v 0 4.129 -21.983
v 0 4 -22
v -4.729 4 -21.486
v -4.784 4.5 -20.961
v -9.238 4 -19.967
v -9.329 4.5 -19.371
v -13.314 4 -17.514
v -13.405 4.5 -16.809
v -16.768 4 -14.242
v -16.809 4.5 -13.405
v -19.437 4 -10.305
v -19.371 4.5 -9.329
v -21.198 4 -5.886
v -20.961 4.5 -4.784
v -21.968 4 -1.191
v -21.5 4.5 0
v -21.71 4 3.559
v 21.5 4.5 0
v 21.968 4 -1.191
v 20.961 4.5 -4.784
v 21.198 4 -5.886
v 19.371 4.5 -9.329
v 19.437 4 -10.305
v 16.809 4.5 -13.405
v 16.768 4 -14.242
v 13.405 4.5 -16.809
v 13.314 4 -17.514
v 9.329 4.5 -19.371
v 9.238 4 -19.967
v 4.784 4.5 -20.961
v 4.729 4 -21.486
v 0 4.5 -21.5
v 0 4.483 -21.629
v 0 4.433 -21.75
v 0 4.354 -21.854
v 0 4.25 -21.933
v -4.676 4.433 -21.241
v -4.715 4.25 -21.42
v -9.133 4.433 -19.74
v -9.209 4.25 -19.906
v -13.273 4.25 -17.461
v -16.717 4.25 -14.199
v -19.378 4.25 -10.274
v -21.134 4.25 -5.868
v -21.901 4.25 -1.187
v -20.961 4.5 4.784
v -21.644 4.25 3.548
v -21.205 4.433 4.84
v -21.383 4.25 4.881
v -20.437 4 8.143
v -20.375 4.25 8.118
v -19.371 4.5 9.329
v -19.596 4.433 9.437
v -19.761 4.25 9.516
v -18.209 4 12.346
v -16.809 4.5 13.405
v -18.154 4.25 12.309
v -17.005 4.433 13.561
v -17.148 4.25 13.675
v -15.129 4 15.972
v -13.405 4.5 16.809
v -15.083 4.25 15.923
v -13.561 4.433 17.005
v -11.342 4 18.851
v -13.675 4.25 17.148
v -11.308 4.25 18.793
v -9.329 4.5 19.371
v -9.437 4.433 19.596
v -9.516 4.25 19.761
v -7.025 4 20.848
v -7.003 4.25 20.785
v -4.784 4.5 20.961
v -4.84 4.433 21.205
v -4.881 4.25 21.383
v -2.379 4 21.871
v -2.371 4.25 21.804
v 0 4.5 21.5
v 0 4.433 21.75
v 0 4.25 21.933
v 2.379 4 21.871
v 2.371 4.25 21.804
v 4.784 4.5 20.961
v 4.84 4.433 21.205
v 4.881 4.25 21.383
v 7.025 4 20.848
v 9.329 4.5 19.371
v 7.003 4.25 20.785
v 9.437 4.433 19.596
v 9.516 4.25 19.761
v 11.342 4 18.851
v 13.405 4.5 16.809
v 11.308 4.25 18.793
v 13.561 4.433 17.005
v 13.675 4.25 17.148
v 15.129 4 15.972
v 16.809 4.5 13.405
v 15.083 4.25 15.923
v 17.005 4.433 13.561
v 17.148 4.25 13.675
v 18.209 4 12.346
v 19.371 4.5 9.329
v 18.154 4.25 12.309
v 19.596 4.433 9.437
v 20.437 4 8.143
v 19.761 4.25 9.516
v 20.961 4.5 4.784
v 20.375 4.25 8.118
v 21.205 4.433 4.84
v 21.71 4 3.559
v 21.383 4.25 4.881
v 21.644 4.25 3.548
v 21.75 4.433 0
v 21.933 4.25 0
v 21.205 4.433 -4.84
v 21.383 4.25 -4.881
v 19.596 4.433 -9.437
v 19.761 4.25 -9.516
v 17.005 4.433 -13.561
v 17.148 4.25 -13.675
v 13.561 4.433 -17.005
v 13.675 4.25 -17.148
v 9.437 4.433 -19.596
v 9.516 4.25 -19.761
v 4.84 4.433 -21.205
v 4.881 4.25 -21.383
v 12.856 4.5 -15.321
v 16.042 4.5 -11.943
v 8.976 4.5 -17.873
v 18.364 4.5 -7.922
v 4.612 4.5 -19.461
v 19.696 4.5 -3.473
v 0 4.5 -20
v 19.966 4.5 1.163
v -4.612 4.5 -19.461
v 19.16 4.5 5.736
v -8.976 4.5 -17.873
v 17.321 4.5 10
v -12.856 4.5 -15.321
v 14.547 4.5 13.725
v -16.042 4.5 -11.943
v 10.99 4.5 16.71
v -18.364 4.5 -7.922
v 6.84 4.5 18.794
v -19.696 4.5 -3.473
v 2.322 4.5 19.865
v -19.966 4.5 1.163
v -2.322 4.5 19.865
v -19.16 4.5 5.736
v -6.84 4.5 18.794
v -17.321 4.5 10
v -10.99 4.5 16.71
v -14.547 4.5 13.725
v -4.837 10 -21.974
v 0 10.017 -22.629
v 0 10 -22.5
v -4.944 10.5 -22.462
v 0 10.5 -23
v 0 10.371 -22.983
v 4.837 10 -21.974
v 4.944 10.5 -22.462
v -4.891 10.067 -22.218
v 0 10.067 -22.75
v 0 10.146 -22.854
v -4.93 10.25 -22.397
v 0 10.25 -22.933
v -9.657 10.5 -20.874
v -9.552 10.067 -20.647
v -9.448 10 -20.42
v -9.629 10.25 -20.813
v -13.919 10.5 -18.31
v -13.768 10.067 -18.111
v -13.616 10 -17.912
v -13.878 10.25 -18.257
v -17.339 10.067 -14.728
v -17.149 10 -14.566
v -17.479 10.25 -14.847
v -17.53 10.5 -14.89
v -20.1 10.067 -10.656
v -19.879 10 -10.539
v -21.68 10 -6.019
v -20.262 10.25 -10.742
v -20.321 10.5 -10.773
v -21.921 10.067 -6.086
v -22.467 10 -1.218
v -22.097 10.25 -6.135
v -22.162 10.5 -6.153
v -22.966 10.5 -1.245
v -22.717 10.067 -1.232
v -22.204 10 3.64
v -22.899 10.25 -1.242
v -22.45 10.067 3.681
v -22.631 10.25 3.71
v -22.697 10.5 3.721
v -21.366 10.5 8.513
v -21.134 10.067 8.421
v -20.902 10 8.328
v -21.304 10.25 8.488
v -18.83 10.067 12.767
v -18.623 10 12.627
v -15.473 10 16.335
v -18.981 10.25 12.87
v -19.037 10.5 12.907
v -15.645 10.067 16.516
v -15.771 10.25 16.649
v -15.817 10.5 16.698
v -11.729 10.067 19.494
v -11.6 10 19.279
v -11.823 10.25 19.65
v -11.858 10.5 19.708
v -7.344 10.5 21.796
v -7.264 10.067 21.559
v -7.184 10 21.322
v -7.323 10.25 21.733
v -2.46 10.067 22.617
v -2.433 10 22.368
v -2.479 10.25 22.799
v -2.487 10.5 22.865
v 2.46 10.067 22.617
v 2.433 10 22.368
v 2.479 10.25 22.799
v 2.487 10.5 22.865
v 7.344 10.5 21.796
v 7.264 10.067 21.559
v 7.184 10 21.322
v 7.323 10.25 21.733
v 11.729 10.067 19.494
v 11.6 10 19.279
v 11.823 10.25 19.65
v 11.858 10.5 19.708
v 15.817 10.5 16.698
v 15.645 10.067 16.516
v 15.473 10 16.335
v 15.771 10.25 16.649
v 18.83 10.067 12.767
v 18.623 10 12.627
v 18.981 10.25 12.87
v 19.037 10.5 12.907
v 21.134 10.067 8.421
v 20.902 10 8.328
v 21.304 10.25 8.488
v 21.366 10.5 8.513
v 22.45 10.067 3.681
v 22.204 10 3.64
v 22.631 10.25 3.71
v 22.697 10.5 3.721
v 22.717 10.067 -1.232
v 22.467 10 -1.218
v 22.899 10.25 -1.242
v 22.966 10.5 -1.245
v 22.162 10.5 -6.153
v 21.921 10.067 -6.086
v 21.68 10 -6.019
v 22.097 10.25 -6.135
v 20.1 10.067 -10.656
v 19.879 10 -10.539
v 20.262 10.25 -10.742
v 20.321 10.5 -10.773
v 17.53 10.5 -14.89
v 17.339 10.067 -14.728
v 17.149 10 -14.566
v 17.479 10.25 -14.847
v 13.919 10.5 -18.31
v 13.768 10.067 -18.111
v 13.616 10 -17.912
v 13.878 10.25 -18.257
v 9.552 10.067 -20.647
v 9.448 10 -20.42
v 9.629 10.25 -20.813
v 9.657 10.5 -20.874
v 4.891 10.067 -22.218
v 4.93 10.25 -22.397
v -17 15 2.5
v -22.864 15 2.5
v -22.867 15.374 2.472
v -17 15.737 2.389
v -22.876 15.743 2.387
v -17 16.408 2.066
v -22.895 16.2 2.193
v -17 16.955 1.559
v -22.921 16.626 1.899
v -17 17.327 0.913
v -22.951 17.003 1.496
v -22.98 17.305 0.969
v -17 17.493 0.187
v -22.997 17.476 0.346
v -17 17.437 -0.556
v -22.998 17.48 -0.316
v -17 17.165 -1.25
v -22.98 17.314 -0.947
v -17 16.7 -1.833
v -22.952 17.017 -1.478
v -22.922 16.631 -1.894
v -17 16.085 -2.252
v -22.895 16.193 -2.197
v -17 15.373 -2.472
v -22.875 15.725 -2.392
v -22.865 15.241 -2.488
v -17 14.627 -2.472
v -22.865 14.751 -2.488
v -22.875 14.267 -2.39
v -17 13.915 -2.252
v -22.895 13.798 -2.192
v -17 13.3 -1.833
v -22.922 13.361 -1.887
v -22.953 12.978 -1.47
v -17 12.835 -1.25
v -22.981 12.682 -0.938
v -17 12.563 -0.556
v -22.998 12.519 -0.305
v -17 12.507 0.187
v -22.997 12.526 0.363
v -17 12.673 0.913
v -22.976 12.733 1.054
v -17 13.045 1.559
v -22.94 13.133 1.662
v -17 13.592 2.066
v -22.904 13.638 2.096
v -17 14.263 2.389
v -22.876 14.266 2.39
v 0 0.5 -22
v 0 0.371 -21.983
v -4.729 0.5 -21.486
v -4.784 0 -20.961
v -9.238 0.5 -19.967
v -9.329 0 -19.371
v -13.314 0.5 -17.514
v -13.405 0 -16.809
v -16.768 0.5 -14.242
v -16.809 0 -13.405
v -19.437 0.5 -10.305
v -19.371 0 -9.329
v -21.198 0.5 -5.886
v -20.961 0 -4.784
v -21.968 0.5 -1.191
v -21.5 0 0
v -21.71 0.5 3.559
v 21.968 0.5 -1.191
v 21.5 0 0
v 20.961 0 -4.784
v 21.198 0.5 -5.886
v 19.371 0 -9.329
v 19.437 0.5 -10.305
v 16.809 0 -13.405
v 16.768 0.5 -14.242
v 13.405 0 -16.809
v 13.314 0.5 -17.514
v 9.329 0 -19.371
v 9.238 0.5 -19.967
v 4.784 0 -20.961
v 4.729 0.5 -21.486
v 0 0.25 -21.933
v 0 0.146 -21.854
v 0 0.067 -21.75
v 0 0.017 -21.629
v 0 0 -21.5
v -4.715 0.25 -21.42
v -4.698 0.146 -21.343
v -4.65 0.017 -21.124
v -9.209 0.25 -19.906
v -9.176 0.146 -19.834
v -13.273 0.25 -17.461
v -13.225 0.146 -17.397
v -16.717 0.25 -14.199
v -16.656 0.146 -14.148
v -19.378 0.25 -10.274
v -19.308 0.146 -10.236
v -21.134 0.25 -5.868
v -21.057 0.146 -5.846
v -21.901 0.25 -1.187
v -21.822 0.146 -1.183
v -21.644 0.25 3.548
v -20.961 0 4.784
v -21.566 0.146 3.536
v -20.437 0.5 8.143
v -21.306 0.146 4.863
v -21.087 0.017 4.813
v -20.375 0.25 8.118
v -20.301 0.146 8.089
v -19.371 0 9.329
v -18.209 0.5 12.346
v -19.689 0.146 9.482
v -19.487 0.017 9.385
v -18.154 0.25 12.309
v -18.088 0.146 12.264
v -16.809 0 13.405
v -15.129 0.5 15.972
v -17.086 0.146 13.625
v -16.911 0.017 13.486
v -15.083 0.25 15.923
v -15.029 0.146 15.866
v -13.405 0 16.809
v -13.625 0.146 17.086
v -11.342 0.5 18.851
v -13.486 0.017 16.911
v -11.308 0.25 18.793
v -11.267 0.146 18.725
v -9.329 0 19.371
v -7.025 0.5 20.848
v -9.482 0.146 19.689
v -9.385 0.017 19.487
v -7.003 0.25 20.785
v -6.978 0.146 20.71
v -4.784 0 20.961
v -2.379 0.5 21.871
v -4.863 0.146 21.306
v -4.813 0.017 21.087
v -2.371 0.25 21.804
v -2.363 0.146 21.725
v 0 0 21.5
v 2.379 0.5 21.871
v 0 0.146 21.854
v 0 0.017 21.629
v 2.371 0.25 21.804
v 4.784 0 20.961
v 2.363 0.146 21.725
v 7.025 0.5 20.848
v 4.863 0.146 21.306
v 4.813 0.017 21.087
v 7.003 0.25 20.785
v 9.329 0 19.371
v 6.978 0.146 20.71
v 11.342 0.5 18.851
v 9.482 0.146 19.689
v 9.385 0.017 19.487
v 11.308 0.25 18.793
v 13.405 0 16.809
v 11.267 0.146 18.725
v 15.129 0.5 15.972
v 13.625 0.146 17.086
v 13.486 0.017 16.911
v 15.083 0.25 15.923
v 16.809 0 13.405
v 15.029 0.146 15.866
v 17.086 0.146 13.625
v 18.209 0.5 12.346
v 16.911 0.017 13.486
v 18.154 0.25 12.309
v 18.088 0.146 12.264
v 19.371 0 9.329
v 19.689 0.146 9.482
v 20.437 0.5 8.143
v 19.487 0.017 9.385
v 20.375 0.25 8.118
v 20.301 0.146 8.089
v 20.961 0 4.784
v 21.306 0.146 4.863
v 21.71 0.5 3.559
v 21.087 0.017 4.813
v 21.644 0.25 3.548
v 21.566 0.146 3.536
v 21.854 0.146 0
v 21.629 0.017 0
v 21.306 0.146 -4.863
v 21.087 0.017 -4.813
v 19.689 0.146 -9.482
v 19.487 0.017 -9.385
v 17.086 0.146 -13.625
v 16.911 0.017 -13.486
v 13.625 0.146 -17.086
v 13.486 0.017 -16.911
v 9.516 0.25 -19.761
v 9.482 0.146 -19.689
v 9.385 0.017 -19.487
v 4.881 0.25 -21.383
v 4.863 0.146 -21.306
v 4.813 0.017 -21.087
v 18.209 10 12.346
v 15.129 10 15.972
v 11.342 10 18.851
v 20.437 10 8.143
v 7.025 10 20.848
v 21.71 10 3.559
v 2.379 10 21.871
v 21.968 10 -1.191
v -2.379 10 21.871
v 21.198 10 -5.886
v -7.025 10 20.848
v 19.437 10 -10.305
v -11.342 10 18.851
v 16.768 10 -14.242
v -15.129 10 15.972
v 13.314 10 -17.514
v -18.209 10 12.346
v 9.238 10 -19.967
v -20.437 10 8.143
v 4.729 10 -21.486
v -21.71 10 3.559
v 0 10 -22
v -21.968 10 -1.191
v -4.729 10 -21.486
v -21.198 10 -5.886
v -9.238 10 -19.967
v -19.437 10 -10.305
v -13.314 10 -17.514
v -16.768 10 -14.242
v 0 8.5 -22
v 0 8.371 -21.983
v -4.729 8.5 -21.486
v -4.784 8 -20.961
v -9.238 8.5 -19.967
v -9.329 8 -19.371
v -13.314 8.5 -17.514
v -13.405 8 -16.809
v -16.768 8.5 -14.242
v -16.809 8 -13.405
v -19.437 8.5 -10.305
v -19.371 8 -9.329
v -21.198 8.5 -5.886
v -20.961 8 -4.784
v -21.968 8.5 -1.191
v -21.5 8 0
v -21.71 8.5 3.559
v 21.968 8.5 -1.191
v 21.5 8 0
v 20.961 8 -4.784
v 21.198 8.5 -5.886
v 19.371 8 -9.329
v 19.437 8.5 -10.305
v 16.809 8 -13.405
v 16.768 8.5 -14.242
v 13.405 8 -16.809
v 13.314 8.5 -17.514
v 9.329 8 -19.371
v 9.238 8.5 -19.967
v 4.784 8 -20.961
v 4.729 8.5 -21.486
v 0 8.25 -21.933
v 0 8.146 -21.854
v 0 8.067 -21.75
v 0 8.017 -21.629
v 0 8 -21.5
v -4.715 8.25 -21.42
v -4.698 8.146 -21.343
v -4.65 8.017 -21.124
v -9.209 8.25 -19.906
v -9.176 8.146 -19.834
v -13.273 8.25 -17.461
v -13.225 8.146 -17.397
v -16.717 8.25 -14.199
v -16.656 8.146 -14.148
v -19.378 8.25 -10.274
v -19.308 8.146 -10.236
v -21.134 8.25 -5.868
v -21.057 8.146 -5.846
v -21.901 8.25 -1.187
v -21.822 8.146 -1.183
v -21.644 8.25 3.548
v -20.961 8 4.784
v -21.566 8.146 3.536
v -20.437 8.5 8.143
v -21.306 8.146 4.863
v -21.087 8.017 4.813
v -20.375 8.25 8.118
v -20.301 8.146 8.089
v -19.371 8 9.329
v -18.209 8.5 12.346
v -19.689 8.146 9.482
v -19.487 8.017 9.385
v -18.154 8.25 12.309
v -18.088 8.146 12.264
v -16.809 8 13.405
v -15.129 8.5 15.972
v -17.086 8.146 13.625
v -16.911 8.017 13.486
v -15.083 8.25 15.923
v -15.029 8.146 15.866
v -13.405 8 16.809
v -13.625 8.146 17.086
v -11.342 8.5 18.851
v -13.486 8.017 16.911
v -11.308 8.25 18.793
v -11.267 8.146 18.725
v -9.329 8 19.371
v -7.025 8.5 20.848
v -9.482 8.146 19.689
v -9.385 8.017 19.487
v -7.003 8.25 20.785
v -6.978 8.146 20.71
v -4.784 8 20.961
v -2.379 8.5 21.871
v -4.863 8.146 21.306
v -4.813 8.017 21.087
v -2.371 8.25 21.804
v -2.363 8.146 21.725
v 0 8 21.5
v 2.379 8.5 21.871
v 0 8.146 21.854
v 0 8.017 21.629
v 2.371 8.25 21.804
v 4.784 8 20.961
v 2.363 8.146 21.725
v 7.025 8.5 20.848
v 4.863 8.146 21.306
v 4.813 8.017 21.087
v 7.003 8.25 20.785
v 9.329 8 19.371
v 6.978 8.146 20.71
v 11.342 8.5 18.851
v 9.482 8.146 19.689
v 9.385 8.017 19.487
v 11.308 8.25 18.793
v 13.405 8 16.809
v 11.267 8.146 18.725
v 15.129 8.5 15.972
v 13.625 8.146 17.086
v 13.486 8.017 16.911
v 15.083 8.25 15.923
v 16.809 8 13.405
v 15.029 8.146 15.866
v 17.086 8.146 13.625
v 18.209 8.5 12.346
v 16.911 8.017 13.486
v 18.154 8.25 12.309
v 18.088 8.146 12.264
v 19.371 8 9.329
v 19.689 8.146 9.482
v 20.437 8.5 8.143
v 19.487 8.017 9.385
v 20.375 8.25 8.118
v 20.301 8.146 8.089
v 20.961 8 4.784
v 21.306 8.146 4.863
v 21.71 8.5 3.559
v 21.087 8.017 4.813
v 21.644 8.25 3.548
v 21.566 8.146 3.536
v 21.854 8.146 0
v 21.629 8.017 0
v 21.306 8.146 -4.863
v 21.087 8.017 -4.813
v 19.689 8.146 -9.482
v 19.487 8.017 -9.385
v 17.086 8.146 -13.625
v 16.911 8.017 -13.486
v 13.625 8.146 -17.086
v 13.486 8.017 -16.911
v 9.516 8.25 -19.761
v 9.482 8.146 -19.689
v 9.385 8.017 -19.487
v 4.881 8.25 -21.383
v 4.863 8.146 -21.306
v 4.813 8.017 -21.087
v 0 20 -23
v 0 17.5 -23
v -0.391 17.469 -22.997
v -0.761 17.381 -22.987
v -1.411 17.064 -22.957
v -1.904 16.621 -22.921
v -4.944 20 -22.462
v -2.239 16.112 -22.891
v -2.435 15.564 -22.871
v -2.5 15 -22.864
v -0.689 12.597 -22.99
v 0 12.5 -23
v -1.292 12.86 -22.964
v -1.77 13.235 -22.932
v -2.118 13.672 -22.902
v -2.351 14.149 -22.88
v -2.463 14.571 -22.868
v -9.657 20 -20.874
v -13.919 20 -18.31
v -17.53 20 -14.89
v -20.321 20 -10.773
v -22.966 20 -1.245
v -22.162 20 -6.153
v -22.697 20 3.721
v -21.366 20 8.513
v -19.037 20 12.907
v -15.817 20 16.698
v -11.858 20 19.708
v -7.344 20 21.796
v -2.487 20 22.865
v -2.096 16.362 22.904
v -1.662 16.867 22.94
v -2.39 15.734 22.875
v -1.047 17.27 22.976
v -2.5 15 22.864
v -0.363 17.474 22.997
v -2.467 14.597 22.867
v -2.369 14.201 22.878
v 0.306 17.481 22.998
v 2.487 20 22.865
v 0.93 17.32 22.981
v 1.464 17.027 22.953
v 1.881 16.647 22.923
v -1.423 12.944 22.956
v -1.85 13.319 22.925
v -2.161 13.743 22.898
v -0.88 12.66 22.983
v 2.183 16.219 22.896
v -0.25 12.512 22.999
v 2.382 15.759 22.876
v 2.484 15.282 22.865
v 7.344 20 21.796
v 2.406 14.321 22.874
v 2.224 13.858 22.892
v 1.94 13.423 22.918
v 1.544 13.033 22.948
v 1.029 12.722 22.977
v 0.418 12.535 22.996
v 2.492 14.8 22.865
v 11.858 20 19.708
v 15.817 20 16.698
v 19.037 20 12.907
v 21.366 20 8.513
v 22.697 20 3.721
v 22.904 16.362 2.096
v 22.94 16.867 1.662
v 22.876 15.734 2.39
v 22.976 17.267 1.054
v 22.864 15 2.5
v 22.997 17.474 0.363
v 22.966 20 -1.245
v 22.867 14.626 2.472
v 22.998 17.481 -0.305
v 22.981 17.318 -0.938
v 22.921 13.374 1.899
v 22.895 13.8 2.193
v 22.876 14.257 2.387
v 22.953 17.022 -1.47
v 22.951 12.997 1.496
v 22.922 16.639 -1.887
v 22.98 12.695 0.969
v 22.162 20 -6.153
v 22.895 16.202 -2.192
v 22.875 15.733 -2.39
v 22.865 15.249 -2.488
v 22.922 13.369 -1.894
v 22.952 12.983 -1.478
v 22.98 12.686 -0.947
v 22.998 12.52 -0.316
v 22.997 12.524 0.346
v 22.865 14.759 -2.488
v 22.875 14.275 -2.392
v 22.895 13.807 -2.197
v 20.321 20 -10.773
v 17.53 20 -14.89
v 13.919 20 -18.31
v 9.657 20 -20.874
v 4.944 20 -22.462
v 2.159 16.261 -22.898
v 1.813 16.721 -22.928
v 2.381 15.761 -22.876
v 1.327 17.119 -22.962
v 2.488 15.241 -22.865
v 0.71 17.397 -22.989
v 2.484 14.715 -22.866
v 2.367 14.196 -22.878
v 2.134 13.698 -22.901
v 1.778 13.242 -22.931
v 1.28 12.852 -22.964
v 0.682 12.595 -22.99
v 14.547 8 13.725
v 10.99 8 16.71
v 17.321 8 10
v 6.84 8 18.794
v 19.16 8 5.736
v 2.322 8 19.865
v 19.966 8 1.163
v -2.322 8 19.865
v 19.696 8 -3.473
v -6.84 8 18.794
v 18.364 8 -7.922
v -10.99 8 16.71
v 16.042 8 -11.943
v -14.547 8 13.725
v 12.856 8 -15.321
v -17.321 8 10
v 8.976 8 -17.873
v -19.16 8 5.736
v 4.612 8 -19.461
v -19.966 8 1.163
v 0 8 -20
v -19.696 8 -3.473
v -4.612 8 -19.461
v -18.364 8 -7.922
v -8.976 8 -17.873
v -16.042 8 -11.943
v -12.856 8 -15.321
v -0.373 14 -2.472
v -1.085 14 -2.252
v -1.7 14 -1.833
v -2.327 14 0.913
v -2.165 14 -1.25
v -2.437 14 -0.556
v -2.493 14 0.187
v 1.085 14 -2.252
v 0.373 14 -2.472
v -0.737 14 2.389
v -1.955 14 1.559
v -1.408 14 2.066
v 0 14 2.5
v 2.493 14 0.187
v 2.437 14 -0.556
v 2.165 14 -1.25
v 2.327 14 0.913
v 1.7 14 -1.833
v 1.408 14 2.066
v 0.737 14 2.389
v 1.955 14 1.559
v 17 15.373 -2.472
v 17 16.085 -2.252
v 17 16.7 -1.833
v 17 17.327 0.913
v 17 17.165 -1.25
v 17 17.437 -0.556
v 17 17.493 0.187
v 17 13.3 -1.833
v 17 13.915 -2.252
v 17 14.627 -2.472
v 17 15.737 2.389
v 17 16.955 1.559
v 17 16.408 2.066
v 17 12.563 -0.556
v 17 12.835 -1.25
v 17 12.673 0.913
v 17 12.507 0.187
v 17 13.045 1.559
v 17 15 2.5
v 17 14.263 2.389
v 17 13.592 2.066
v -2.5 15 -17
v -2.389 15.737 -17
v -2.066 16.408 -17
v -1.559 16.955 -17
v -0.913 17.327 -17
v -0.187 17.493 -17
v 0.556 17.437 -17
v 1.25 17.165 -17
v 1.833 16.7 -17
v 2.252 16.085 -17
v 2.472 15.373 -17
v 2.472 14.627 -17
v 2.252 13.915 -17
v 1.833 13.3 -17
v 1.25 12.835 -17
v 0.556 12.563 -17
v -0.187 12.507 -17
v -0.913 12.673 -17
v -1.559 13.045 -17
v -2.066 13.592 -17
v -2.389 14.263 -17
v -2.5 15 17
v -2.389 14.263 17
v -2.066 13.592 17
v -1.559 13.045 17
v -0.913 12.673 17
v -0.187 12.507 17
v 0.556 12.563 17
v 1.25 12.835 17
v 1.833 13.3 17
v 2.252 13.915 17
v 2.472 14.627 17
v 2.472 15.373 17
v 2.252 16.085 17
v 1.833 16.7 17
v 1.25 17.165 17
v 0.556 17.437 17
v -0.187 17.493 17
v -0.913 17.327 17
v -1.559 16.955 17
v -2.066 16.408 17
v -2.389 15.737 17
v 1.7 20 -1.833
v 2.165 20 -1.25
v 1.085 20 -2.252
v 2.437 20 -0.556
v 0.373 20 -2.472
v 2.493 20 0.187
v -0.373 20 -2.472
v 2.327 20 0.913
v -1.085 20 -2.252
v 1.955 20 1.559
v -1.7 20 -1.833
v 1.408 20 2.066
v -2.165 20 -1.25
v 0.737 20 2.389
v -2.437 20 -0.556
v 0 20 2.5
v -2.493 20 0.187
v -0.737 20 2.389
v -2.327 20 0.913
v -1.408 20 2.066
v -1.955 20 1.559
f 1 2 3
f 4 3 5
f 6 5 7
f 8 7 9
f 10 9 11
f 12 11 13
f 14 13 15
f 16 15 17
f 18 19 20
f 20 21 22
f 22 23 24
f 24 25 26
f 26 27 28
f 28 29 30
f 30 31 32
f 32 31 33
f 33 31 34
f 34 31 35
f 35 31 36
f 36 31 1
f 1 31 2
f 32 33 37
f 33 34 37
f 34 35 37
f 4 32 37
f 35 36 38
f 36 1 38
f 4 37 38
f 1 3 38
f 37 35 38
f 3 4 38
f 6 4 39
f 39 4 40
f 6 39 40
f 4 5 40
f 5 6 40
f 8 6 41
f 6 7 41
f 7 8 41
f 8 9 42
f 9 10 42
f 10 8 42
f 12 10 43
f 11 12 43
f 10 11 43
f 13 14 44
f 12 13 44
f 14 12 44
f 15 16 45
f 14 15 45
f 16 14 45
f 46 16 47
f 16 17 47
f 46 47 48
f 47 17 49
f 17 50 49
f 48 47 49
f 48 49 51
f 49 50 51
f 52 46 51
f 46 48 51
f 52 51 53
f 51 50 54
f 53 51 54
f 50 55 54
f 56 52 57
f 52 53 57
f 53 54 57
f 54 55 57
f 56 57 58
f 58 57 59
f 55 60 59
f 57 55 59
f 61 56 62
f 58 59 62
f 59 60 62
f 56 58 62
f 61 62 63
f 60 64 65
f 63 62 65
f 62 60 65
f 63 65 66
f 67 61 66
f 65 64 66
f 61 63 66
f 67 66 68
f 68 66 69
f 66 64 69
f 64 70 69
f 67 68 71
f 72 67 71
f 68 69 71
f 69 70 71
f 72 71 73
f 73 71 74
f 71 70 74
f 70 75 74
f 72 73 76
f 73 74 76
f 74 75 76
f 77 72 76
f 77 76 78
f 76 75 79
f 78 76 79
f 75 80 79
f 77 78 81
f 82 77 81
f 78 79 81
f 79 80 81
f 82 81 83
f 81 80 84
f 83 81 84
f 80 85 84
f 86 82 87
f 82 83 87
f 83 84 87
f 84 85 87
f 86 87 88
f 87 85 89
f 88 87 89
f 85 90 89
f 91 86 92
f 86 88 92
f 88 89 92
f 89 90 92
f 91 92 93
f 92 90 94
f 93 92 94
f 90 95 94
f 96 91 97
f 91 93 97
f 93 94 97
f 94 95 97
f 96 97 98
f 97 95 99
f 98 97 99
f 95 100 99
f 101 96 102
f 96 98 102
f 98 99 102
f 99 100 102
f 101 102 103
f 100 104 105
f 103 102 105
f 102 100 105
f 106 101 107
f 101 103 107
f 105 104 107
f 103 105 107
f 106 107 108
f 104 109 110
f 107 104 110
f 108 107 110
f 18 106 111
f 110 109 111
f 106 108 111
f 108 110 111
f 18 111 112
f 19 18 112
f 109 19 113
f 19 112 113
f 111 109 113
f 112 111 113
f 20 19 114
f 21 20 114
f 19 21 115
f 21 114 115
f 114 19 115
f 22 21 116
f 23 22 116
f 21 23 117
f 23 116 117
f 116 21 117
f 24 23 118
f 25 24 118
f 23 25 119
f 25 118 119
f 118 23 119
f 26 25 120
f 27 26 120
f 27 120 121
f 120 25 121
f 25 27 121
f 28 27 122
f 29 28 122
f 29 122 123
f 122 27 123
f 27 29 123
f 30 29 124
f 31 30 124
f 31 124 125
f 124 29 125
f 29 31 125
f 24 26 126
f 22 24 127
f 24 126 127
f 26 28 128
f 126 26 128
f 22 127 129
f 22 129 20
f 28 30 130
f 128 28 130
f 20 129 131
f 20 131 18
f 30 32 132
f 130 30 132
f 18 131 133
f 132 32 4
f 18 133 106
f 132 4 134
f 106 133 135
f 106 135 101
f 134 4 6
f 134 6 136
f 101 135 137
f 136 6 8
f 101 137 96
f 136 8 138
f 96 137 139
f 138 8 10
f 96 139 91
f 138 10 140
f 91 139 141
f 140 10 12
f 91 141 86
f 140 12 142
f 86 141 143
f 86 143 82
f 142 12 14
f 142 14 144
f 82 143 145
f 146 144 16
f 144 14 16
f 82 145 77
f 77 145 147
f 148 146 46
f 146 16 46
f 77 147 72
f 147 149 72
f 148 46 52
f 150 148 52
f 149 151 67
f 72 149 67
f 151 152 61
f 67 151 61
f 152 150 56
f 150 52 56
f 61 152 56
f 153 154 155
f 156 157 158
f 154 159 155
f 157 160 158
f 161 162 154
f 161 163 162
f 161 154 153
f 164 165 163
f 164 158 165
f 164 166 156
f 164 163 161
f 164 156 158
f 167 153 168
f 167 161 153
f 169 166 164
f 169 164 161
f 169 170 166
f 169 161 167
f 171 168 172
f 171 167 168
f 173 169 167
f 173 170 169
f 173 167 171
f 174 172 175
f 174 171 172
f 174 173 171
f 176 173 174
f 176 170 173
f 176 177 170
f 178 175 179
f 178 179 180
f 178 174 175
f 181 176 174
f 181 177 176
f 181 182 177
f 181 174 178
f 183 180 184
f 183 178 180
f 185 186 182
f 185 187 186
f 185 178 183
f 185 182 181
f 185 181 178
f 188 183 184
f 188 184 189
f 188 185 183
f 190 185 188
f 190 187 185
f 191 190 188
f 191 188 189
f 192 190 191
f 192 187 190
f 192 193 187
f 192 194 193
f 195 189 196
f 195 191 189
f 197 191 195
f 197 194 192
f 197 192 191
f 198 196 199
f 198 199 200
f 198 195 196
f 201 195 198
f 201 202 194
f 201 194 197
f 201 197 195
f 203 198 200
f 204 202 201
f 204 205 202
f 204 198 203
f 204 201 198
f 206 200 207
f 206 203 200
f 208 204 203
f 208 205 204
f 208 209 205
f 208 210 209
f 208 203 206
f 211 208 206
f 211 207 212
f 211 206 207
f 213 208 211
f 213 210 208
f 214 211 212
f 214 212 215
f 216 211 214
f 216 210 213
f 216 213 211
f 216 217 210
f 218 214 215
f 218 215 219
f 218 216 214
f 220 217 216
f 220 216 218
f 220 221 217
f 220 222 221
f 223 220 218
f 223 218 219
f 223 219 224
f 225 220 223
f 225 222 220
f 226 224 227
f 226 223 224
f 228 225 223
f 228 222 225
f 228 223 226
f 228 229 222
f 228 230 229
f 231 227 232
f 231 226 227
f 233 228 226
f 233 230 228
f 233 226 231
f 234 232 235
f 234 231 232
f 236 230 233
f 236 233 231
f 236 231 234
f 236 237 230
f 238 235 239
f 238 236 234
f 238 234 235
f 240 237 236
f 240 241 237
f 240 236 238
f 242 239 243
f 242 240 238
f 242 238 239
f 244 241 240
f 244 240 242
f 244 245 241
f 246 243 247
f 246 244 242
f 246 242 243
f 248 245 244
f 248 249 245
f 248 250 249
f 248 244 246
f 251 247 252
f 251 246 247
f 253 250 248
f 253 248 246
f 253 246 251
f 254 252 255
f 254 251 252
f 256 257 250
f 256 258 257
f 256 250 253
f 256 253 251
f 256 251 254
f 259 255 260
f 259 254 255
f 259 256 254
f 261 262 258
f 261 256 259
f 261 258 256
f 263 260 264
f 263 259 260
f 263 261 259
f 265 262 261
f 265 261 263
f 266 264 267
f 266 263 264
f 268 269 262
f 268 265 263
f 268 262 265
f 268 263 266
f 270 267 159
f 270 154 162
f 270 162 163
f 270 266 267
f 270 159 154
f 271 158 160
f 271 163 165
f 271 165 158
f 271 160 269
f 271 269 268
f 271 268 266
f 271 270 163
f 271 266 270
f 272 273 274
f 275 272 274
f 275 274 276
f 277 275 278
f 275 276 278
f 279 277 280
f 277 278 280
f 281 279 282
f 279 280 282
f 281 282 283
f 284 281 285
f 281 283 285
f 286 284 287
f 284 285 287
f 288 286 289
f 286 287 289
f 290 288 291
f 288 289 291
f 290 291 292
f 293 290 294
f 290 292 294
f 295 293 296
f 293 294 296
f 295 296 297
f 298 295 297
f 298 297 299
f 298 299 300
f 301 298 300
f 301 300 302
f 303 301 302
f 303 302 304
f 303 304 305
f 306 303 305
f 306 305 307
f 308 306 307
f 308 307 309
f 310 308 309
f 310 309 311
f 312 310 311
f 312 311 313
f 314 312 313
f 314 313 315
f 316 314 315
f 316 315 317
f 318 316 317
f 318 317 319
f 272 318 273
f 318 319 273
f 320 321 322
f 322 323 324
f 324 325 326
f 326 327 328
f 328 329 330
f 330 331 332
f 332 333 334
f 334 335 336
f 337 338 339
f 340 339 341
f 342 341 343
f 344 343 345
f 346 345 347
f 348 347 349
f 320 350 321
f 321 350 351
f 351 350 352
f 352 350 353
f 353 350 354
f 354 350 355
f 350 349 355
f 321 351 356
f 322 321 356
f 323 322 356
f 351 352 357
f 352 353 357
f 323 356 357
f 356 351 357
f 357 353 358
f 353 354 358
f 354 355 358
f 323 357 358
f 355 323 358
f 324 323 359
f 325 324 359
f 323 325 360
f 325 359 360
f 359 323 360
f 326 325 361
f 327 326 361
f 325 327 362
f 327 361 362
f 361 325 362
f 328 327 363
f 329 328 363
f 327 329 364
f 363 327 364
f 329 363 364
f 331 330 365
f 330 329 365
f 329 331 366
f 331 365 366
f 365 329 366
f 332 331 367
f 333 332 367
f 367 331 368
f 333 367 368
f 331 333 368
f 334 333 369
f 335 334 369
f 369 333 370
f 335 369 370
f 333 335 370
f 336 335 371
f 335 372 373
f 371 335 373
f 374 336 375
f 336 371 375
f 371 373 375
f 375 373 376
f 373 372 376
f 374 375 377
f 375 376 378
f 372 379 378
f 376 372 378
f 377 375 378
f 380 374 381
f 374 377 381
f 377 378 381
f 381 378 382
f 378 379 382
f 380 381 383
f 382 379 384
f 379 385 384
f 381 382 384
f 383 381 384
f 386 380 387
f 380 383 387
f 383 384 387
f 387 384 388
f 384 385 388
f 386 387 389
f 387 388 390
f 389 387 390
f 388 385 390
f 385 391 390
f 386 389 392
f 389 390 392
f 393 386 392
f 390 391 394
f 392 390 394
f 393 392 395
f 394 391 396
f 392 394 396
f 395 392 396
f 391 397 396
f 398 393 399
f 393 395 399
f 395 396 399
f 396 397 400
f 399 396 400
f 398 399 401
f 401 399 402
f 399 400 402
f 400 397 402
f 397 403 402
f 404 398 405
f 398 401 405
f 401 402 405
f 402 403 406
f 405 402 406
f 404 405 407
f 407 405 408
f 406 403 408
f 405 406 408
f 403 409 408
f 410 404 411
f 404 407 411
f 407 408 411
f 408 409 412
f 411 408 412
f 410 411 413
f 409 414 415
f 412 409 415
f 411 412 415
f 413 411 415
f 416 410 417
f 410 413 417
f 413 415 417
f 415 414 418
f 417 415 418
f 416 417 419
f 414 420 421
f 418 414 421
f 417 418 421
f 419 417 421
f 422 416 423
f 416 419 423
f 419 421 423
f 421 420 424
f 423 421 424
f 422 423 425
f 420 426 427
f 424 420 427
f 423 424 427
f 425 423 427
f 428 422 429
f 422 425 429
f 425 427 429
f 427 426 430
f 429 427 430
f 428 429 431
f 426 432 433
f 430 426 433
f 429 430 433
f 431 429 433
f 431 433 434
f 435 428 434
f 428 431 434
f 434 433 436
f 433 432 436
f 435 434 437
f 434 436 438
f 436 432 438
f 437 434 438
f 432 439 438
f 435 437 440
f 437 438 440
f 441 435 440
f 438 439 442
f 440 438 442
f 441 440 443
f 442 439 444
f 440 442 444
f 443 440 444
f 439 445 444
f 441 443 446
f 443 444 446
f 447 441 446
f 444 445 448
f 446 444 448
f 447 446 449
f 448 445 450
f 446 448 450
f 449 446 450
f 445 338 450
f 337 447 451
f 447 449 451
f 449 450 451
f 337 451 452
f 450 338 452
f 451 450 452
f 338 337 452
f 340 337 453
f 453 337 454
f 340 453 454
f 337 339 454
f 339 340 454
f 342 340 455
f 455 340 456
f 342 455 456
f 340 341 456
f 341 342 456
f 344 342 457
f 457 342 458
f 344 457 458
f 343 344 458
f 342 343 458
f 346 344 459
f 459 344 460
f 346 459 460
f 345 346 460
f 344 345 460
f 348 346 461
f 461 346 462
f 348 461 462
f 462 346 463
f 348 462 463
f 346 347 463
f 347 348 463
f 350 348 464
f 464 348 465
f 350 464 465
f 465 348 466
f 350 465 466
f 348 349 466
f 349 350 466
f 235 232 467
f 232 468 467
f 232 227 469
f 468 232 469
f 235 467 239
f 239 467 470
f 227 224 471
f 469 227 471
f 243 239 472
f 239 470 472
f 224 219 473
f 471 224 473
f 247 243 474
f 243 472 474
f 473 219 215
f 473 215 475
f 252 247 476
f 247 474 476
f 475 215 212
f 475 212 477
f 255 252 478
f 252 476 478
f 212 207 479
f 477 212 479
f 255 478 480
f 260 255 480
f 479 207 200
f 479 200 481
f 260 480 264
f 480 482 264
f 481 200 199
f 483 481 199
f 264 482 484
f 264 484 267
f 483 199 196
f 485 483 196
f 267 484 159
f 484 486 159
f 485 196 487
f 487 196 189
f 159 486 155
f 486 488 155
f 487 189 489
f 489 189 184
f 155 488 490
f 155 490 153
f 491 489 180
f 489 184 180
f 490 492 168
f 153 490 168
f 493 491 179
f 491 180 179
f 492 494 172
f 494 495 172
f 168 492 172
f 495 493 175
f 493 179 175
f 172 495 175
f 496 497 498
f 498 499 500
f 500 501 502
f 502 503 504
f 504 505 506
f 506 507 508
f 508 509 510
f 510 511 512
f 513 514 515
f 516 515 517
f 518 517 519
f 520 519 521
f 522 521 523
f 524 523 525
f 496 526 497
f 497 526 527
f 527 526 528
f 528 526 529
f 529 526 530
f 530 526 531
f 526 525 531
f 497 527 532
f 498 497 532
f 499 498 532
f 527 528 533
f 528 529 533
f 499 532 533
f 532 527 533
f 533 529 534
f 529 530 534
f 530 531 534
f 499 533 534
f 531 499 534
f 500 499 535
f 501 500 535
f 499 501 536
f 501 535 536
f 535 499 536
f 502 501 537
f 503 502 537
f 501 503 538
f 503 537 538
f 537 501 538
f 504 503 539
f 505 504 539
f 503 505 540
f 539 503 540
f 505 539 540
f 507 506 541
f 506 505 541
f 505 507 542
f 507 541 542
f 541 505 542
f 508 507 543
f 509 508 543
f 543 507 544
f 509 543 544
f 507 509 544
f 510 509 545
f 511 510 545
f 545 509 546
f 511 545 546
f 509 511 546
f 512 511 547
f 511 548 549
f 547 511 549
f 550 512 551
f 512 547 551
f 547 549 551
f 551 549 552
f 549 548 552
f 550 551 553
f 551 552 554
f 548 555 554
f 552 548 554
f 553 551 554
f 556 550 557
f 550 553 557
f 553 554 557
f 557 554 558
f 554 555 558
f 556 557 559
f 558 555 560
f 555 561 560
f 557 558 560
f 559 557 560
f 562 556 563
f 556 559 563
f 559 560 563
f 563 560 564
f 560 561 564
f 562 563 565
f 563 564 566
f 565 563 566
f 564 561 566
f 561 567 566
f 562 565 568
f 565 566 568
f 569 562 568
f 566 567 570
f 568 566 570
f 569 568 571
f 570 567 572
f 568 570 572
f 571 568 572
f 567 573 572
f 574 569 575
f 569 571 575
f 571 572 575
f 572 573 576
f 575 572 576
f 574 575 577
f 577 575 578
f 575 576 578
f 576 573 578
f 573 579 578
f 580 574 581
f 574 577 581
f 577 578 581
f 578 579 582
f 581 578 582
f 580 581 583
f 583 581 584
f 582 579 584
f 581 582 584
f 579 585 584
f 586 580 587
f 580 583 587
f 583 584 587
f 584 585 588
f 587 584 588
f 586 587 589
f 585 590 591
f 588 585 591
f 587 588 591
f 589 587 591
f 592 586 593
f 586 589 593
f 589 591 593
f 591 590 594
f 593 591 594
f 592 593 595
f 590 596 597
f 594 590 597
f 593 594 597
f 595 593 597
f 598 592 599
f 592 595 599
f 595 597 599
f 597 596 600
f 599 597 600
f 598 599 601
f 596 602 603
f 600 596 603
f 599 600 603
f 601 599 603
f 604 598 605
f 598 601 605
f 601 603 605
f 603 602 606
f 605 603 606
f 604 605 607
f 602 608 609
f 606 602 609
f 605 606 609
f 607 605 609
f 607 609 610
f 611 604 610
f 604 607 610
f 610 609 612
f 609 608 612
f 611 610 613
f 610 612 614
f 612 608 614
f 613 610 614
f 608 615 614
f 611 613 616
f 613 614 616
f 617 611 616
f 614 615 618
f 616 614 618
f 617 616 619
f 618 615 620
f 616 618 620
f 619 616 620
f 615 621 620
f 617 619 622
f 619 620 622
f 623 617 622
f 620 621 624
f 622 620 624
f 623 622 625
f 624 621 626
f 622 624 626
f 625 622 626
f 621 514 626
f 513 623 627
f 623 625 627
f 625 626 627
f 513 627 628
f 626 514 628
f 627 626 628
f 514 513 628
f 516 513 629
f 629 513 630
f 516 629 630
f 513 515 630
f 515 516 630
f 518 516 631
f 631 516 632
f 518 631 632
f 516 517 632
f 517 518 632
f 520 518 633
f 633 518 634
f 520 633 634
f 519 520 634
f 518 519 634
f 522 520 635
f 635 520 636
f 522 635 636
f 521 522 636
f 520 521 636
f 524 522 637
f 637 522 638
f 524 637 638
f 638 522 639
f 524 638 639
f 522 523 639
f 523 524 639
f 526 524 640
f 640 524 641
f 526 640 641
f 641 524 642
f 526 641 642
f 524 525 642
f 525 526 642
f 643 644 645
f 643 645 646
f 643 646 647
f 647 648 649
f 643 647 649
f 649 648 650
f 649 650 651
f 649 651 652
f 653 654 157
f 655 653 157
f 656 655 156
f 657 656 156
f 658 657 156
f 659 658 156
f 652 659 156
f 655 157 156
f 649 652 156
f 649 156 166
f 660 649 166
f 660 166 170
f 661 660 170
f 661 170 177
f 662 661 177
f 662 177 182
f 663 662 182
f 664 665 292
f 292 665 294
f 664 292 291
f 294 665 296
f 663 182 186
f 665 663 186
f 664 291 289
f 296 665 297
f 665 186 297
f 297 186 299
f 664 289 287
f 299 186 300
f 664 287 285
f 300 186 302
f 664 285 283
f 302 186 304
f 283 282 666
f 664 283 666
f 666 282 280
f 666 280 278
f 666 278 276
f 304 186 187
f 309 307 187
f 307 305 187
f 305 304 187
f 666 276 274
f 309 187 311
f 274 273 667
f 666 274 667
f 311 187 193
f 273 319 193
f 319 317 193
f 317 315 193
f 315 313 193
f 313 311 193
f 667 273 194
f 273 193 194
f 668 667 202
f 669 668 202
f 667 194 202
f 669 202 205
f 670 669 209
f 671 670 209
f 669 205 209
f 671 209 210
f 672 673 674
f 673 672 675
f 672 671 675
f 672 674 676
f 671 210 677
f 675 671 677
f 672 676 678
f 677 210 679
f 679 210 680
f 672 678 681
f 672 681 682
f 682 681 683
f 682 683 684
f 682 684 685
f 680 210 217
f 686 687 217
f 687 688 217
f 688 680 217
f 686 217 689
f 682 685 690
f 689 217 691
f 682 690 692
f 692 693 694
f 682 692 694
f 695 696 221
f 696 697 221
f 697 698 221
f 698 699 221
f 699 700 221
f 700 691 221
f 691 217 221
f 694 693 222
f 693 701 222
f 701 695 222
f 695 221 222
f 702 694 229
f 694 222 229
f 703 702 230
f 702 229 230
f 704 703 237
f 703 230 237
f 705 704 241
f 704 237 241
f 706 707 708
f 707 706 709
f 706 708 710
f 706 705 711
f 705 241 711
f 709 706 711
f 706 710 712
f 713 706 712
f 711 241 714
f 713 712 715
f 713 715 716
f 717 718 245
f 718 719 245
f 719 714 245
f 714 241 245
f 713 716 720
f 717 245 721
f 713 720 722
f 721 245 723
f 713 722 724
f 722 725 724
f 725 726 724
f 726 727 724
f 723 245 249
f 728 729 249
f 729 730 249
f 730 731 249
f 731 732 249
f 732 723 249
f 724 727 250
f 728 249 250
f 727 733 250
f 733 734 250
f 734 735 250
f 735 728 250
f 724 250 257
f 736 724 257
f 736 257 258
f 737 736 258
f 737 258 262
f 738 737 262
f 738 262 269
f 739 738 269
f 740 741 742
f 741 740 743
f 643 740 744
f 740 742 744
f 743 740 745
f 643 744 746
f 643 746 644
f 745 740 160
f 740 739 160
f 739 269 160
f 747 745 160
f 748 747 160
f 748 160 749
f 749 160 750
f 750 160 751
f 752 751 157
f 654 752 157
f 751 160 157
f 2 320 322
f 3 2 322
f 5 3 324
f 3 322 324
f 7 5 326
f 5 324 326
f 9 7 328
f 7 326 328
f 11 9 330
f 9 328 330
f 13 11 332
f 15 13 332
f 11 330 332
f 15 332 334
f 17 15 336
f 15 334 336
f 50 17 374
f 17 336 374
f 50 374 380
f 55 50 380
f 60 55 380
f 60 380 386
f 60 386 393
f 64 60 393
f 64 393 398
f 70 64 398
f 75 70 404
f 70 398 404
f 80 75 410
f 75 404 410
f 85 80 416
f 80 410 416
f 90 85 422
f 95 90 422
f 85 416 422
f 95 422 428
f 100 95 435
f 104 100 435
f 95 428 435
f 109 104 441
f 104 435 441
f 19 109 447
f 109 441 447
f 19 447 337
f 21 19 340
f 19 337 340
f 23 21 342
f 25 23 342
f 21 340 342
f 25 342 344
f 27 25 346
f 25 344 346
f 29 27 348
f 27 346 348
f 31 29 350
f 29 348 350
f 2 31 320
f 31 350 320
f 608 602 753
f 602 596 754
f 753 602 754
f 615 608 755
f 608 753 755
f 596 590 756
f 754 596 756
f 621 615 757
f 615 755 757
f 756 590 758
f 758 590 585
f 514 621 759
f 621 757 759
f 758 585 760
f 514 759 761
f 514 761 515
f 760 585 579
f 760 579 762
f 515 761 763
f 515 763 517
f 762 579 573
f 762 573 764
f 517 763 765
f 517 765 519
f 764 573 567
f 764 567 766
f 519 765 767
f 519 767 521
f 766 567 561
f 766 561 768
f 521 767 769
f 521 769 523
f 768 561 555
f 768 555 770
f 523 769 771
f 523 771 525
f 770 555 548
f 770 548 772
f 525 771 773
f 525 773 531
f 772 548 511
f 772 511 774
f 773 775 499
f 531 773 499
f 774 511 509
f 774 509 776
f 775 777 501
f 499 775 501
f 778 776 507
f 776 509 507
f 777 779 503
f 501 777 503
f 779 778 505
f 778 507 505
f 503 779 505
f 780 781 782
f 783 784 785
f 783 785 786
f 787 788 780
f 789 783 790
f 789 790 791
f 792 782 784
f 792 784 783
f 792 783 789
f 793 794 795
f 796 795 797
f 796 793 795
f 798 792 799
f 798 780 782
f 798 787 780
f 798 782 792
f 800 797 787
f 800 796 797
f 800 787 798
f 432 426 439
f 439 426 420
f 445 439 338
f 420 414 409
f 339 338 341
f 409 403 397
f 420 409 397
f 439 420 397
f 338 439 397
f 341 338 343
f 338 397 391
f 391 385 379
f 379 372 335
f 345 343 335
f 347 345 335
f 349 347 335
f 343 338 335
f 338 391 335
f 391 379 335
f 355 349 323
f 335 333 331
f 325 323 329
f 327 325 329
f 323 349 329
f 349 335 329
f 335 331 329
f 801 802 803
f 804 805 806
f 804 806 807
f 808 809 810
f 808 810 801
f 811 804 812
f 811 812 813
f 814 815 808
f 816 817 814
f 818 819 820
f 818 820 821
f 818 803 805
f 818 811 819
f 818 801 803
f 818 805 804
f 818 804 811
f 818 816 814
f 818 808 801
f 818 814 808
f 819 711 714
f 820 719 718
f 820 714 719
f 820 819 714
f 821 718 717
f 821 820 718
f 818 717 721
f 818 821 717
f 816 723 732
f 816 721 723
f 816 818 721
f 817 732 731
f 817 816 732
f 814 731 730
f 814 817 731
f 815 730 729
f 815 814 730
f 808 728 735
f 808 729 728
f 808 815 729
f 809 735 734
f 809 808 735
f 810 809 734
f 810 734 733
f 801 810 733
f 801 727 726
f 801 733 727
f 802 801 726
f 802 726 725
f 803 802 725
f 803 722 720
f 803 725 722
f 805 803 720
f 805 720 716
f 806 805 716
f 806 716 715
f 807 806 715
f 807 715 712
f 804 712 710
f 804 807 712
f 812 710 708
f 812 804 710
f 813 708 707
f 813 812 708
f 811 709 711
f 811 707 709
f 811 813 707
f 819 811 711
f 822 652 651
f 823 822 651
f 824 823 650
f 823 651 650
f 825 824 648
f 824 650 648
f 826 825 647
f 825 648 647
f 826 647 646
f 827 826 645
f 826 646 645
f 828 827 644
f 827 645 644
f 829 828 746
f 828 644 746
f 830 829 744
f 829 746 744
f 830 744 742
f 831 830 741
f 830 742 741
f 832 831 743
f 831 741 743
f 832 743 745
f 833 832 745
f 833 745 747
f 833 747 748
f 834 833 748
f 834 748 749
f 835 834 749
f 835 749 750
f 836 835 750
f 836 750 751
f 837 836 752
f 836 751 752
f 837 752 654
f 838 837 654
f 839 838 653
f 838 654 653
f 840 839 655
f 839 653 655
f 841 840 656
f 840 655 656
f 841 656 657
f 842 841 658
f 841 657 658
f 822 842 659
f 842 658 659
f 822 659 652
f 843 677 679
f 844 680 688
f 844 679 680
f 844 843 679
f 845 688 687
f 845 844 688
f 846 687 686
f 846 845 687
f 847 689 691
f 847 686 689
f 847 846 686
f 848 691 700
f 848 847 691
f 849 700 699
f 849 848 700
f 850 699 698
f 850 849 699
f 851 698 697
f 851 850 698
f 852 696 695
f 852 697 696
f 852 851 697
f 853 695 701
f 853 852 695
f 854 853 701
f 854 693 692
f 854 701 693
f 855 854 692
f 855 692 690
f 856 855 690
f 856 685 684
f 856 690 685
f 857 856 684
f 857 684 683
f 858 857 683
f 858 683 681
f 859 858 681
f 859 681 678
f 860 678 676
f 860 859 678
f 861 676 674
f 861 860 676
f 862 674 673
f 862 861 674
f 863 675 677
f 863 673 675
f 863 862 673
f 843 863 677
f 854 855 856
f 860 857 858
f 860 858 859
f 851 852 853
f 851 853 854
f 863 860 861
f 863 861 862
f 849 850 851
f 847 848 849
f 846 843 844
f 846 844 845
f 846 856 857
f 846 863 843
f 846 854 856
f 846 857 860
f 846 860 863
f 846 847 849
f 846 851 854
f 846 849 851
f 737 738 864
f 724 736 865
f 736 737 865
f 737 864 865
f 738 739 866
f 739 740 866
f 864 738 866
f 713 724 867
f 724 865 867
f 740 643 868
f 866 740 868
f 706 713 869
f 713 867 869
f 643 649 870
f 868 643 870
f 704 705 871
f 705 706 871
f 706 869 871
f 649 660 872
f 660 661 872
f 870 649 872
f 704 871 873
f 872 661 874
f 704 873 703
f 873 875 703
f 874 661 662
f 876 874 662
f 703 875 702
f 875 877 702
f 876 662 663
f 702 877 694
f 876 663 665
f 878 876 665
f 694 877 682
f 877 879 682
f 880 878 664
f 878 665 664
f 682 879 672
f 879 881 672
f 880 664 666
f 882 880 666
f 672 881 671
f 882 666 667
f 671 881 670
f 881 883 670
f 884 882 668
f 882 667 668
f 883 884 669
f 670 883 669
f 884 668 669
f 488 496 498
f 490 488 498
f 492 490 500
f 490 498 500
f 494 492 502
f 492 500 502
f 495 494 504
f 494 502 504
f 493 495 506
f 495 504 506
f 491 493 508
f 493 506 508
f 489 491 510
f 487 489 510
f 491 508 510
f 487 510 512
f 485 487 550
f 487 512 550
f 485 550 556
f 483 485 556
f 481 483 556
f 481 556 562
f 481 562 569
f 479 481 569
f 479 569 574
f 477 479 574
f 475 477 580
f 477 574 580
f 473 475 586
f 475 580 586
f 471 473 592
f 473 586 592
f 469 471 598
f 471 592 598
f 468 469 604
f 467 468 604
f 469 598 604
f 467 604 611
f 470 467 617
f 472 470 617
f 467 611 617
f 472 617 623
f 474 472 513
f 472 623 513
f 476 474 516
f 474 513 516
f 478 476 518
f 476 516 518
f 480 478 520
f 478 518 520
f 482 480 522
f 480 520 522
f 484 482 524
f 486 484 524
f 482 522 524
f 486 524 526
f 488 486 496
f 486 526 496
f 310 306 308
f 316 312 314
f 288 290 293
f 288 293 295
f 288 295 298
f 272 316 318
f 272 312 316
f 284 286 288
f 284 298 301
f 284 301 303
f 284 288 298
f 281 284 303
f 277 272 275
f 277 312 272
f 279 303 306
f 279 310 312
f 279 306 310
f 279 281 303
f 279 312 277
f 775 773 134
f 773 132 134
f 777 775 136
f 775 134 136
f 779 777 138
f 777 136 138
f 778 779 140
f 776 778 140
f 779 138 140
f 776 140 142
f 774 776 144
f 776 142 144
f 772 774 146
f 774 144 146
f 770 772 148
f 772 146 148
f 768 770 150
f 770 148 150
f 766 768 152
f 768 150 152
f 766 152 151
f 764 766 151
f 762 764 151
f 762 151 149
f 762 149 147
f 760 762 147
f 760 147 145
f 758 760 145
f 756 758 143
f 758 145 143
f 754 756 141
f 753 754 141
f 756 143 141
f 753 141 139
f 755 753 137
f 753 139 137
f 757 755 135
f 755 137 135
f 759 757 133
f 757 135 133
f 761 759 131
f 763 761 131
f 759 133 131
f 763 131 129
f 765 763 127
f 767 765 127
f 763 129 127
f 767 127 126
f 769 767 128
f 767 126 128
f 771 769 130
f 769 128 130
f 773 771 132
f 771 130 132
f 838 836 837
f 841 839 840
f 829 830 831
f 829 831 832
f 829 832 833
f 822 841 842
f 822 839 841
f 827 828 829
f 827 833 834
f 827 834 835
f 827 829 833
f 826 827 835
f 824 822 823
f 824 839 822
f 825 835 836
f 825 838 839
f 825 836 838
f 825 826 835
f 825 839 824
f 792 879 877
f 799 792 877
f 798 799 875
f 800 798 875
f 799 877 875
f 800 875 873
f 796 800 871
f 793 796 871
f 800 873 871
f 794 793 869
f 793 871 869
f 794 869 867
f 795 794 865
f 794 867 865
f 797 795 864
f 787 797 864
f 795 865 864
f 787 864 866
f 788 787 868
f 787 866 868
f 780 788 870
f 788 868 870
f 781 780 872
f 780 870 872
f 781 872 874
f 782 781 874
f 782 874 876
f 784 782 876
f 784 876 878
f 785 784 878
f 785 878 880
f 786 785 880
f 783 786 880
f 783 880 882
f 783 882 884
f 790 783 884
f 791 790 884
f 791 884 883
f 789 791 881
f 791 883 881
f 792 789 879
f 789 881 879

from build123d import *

# Parameters (mm, degrees)
SKETCH_3_R          = 2.5
CUT_EXTRUDE_1_DEPTH = 6
SKETCH_4_R          = 2.5
CUT_EXTRUDE_2_DEPTH = 6
CUT_EXTRUDE_START   = -6
SKETCH_5_R          = 2.5
CUT_EXTRUDE_3_DEPTH = 6
SKETCH_6_R          = 2.5
CUT_EXTRUDE_4_DEPTH = 6
SKETCH_7_R          = 2.5
CUT_EXTRUDE_5_DEPTH = 6
FILLET_1_R          = 0.5
FILLET_2_R          = 0.5
FILLET_3_R          = 0.5
FILLET_4_R          = 0.5


with BuildPart() as part:
    # 스케치2 → 회전1 (revolve)
    with BuildSketch(Plane.XY, mode=Mode.PRIVATE) as revolve_1_sk:
        Polygon((0, 0), (0, 20), (23, 20), (23, 10), (22, 10), (22, 8), (20, 8), (20, 4.5), (22, 4.5), (22, 0), align=None)
    revolve(revolve_1_sk.sketch.rotate(Axis((0, 0, 0), (0, 1, 0)), 90), axis=Axis((0, 0, 0), (0, 1, 0)))

    # 스케치3 → 컷-돌출1 (cut)
    with BuildSketch(Plane.ZY.offset(23)):
        with Locations((0, 15)):
            Circle(SKETCH_3_R)
    extrude(amount=-CUT_EXTRUDE_1_DEPTH, mode=Mode.SUBTRACT)

    # 스케치4 → 컷-돌출2 (cut)
    with BuildSketch(Plane(origin=(0, 0, -23), x_dir=(-1, 0, 0), z_dir=(0, 0, -1))):
        with Locations((0, 15)):
            Circle(SKETCH_4_R)
    extrude(amount=-CUT_EXTRUDE_2_DEPTH, mode=Mode.SUBTRACT)

    # 스케치5 → 컷-돌출3 (cut)
    with BuildSketch(Plane(origin=(23, 0, 0), x_dir=(0, 0, -1), z_dir=(1, 0, 0)).offset(CUT_EXTRUDE_START)):
        with Locations(Location((0, 15, 0), (0, 0, 180))):
            Circle(SKETCH_5_R)
    extrude(amount=CUT_EXTRUDE_3_DEPTH, mode=Mode.SUBTRACT)

    # 스케치6 → 컷-돌출4 (cut)
    with BuildSketch(Plane.XY.offset(23).offset(CUT_EXTRUDE_START)):
        with Locations(Location((0, 15, 0), (0, 0, 180))):
            Circle(SKETCH_6_R)
    extrude(amount=CUT_EXTRUDE_4_DEPTH, mode=Mode.SUBTRACT)

    # 스케치7 → 컷-돌출5 (cut)
    with BuildSketch(Plane(origin=(0, 20, 0), x_dir=(1, 0, 0), z_dir=(0, 1, 0))):
        with Locations(Location((0, 0, 0), (0, 0, 270))):
            Circle(SKETCH_7_R)
    extrude(amount=-CUT_EXTRUDE_5_DEPTH, mode=Mode.SUBTRACT)

    # 필렛1
    fillet_1_edges = [part.edges().sort_by_distance(p)[0] for p in [
        (0, 8, 22),
    ]]
    fillet(fillet_1_edges, radius=FILLET_1_R)

    # 필렛2
    fillet_2_edges = [part.edges().sort_by_distance(p)[0] for p in [
        (0, 4.5, 22),
    ]]
    fillet(fillet_2_edges, radius=FILLET_2_R)

    # 필렛3
    fillet_3_edges = [part.edges().sort_by_distance(p)[0] for p in [
        (0, 0, 22),
    ]]
    fillet(fillet_3_edges, radius=FILLET_3_R)

    # 필렛4
    fillet_4_edges = [part.edges().sort_by_distance(p)[0] for p in [
        (0, 10, 23),
    ]]
    fillet(fillet_4_edges, radius=FILLET_4_R)


solid = part.part
